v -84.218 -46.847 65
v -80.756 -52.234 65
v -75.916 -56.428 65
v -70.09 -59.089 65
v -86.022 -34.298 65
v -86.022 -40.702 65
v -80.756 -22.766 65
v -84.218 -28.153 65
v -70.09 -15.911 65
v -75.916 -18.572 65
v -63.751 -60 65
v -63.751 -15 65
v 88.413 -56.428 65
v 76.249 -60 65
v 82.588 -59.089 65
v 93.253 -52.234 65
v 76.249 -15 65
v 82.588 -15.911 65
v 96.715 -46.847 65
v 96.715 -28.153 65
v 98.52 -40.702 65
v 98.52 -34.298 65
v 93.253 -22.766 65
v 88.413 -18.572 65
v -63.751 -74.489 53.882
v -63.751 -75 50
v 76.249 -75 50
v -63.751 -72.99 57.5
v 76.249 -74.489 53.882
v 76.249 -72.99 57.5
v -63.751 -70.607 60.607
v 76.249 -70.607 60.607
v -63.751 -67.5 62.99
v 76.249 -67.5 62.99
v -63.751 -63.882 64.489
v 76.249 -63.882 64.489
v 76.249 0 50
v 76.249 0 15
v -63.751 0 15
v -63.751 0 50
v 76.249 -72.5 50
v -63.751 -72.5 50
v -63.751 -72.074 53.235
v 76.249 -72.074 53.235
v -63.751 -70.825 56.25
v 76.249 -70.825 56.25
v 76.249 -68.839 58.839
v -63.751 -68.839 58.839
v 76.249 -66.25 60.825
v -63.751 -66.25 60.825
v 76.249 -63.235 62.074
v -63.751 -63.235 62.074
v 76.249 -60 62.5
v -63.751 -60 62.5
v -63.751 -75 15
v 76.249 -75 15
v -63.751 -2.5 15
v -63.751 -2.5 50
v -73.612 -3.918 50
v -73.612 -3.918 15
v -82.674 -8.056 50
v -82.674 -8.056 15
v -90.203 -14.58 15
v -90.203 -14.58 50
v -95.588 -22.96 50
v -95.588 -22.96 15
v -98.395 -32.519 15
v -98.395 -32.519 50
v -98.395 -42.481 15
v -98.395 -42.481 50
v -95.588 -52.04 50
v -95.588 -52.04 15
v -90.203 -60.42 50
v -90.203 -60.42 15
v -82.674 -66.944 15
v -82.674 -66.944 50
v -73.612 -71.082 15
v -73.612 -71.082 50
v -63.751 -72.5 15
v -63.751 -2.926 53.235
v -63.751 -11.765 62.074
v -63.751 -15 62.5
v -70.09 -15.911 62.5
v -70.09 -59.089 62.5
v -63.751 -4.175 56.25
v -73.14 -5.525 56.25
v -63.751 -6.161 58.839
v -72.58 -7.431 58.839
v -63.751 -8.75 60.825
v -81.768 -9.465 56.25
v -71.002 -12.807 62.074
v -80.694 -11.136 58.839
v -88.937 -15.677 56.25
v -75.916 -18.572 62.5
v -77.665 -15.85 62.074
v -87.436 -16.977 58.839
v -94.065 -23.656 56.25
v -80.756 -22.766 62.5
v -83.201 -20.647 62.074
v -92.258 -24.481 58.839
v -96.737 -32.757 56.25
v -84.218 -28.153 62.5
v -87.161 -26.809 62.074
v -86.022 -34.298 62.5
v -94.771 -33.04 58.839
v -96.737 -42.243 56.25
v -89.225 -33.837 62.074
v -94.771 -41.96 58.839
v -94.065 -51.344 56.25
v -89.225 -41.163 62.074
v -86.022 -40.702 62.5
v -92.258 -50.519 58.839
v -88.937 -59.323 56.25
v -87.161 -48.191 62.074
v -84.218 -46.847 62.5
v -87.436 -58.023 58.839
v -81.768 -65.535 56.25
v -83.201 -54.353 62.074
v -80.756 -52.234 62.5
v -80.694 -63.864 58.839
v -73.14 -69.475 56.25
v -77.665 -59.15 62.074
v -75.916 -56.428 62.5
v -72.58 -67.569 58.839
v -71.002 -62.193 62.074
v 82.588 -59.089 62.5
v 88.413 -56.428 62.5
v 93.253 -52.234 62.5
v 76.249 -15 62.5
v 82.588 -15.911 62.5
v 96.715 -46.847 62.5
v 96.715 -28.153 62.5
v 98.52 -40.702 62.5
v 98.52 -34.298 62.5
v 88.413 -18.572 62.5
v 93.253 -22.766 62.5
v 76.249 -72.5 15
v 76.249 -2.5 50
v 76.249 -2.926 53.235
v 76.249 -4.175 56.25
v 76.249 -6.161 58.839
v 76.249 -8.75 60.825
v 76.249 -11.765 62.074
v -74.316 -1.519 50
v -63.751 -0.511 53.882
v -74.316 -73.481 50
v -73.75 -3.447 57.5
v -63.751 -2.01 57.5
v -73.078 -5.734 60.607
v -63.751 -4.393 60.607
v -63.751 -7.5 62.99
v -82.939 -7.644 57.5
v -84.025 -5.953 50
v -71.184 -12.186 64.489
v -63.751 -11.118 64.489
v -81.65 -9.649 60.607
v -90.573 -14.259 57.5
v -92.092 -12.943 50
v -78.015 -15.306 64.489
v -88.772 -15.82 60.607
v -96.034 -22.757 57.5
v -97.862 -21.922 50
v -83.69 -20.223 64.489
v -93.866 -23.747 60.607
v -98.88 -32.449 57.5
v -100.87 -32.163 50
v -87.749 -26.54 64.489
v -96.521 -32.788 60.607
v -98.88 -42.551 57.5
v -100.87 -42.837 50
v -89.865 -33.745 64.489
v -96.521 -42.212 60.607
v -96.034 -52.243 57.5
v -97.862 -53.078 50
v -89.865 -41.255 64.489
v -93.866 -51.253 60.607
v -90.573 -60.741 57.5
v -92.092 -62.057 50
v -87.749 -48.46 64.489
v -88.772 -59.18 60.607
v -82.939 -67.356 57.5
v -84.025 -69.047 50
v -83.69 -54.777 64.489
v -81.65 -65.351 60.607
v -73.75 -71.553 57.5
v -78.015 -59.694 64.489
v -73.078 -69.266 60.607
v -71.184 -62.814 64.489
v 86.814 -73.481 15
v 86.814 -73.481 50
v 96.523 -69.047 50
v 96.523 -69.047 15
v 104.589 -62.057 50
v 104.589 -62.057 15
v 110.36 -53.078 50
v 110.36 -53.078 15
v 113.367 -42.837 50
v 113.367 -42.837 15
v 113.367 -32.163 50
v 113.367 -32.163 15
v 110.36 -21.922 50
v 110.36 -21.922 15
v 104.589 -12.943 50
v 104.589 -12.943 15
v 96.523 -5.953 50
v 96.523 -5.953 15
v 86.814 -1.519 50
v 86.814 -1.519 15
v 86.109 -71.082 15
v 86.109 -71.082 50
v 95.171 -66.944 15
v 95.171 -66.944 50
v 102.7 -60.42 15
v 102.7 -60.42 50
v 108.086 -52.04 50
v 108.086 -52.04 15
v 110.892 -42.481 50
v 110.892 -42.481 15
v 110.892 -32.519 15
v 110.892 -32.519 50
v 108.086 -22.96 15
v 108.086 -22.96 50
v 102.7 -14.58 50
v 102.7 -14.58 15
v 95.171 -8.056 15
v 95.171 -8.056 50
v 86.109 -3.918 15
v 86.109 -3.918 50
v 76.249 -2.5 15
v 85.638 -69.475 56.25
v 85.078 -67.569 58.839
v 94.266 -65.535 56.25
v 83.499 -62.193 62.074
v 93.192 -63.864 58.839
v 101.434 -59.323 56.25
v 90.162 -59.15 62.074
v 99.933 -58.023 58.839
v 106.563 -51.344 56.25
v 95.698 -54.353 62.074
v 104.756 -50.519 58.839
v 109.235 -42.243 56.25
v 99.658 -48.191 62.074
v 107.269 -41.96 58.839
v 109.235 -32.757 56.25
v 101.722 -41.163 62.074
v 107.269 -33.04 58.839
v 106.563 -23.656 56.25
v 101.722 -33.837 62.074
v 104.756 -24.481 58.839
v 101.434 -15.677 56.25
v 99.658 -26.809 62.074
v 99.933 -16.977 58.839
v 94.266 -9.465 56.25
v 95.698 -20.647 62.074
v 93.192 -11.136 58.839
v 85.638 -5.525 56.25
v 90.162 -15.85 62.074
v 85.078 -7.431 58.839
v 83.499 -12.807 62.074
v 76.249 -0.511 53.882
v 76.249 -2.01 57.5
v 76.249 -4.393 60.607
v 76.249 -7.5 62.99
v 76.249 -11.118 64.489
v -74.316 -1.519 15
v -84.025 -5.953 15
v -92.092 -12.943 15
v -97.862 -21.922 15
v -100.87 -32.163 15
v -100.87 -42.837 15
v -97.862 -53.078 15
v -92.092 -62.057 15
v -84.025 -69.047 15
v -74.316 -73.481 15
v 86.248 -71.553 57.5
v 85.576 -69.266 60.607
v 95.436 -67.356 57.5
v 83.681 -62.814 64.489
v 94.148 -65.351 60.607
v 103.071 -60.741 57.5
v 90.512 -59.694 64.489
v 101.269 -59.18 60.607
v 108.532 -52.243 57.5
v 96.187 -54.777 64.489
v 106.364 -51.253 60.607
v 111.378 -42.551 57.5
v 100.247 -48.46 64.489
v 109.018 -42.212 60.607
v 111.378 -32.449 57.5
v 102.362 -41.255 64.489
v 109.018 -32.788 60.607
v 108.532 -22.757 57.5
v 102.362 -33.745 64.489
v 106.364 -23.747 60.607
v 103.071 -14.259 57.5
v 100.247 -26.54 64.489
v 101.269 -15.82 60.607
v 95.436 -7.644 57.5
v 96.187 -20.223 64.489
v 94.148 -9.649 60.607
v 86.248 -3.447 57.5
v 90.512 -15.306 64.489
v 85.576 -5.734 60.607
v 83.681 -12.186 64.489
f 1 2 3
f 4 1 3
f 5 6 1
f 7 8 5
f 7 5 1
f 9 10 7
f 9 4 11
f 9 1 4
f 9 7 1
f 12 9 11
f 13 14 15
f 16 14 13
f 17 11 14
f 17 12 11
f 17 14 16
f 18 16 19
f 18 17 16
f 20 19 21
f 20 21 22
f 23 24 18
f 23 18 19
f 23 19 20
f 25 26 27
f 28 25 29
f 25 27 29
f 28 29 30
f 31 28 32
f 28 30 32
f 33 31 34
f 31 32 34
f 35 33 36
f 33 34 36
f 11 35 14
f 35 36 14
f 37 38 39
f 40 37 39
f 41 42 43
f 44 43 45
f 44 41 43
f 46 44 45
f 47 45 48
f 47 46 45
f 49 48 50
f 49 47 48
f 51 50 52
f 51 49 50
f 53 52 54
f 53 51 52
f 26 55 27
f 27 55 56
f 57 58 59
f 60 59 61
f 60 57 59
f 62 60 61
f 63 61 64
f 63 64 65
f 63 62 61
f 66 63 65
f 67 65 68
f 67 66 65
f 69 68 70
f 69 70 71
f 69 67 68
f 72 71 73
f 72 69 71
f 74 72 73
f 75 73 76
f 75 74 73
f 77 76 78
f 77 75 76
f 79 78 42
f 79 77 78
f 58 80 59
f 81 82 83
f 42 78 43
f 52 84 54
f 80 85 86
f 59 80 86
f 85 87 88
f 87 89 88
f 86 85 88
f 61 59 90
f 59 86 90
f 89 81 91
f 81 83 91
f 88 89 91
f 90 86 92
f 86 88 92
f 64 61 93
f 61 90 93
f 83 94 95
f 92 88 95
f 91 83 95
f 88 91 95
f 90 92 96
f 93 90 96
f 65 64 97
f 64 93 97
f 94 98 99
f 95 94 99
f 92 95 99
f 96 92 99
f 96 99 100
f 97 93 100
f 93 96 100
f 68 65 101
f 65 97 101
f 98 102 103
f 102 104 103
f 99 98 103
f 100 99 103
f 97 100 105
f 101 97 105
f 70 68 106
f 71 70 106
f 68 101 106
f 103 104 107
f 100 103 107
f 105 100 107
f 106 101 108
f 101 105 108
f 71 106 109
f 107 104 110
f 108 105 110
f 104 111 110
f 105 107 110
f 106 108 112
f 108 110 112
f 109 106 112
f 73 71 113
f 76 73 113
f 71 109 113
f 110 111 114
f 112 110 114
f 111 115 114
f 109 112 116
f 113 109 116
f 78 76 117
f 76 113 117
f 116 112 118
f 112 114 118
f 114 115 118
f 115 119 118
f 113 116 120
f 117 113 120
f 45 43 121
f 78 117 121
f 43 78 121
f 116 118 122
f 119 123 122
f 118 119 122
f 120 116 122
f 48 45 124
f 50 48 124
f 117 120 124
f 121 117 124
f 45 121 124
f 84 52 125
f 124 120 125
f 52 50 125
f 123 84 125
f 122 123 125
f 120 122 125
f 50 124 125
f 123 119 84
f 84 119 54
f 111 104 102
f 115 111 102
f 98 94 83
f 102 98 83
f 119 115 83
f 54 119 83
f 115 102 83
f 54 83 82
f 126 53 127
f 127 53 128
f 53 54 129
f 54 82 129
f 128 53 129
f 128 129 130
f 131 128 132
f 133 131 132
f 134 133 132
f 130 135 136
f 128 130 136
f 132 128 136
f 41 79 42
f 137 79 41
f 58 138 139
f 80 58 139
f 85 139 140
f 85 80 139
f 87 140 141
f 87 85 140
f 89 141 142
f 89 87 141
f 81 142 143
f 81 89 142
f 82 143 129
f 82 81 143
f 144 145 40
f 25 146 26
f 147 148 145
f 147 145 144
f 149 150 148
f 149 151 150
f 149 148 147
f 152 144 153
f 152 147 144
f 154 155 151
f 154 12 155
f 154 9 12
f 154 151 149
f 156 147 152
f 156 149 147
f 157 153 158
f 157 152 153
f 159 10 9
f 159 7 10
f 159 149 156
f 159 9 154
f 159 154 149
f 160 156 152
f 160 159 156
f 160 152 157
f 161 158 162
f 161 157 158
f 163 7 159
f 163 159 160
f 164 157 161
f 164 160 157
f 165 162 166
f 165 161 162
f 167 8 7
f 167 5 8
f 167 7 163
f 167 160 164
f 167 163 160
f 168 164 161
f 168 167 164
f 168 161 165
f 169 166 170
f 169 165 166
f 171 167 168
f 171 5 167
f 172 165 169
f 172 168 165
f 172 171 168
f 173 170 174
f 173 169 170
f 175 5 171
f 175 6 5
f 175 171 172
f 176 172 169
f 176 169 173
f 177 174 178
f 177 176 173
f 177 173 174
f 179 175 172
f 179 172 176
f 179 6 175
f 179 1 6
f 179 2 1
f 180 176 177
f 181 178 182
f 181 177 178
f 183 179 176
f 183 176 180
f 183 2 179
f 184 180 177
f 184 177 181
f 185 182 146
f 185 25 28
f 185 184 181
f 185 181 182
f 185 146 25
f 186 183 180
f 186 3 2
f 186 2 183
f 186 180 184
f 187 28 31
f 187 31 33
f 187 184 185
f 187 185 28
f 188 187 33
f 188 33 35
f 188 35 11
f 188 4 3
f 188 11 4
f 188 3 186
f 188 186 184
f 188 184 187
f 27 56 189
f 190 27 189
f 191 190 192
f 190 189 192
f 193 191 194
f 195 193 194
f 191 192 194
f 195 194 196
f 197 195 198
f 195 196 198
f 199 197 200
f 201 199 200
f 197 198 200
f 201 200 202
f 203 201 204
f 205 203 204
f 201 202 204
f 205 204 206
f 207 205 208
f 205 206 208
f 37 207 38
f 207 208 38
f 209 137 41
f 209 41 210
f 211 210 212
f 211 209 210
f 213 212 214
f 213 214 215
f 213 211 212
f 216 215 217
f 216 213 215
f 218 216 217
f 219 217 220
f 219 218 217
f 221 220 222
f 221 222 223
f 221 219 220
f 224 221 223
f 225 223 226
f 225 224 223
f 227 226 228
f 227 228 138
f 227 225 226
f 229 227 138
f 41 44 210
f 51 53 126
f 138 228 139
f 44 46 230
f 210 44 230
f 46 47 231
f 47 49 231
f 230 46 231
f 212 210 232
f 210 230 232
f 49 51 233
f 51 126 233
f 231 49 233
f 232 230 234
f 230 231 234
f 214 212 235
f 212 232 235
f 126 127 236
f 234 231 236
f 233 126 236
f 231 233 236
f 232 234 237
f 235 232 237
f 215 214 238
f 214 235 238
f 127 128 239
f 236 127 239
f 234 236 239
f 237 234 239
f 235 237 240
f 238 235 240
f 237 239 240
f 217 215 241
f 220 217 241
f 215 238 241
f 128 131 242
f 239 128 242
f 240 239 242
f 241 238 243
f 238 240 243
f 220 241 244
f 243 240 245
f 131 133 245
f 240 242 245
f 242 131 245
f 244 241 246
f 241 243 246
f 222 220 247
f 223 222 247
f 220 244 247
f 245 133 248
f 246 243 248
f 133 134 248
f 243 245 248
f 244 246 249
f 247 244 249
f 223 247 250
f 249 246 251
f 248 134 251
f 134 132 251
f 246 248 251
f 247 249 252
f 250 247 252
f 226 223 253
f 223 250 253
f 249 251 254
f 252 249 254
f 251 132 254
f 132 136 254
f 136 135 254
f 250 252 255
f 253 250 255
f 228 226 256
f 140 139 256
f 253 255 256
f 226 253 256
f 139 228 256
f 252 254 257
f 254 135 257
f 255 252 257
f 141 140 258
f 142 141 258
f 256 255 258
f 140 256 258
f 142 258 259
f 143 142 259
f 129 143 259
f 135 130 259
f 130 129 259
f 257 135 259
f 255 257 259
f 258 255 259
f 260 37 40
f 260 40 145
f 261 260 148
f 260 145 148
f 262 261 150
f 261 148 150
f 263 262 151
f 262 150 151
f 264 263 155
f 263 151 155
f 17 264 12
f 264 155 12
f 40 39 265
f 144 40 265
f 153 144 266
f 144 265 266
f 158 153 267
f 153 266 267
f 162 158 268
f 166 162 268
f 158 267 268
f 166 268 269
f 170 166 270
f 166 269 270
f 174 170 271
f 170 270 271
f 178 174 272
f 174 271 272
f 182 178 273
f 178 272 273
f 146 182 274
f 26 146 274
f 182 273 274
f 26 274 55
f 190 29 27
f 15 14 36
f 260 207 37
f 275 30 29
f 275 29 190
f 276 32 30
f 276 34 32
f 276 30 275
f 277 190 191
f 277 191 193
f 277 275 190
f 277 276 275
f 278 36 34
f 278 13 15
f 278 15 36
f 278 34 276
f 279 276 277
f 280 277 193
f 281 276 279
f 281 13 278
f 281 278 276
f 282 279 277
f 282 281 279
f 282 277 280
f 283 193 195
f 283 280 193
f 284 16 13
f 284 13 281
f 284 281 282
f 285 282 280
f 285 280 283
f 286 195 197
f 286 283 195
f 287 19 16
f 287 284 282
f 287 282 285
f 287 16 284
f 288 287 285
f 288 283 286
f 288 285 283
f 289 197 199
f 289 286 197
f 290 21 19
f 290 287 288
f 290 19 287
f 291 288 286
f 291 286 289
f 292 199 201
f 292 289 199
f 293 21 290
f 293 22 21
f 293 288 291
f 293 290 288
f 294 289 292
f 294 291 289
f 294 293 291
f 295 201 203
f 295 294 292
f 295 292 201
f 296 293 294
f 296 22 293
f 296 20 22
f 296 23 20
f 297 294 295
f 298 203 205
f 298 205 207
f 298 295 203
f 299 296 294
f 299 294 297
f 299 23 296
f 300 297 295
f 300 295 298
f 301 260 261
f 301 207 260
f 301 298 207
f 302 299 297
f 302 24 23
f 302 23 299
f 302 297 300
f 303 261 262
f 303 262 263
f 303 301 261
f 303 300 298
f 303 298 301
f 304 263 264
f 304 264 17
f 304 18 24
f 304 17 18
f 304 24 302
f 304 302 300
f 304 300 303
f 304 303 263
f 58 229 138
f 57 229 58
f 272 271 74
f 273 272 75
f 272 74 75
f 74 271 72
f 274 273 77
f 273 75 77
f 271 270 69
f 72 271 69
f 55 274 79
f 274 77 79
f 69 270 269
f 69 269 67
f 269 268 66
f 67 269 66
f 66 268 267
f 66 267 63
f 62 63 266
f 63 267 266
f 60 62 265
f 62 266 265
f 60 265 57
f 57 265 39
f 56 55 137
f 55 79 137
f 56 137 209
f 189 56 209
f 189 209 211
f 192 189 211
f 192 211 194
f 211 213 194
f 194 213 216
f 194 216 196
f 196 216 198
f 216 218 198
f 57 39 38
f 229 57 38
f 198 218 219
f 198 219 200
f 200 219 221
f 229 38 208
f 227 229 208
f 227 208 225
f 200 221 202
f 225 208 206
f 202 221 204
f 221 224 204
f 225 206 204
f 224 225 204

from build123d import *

# Parameters (mm, degrees)
F0_W     = 63.7512656803
F0_H     = 75
F0_W_2   = 76.2487343197
F1_DEPTH = 65
F2_R     = 15
F3_T     = 2.5


# Not quite as in the source:
# - a shell that OpenCascade refuses in one call is made with other operations: the cavity is built on its own and cut out


with BuildPart() as f1:
    # F0 (on Top) → F1 (new body)
    with BuildSketch(Plane.XY):
        with BuildLine():
            Line((-63.7512656803, -75), (-63.7512656803, 0))
            ThreePointArc((-63.7512656803, 0), (-101.2512656803, -37.5), (-63.7512656803, -75))
        make_face()
        with Locations((-31.8756328402, -37.5)):
            Rectangle(F0_W, F0_H)
        with Locations((38.1243671598, -37.5)):
            Rectangle(F0_W_2, F0_H)
        with BuildLine():
            ThreePointArc((76.2487343197, -75), (113.7487343197, -37.5), (76.2487343197, 0))
            Line((76.2487343197, 0), (76.2487343197, -75))
        make_face()
    extrude(amount=F1_DEPTH)

    # F2
    f2_edges = [f1.edges().sort_by_distance(p)[0] for p in [
        (-101.251266, -37.5, 65),
        (113.748734, -37.5, 0),
        (6.248734, -75, 65),
        (113.748734, -37.5, 65),
        (6.248734, 0, 65),
    ]]
    fillet(f2_edges, radius=F2_R)

    # F3: shell of thickness 2.5, made by hand


with BuildPart() as f3_core1:
    # F3_t2: copy of F1
    add(f1.part)

    # the walls: a layer under each face that stays
    f3_faces = [f3_core1.faces().sort_by_distance(p)[0] for p in [
        (-101.2512656803, -37.5, 32.5),
        (6.2487343197, 0, 32.5),
        (-96.8578673981, -37.5, 60.6066017178),
        (6.2487343197, -75, 32.5),
        (113.7487343197, -37.5, 32.5),
        (6.2487343197, -4.3933982822, 60.6066017178),
        (6.2487343197, -37.5, 65),
        (6.2487343197, -70.6066017178, 60.6066017178),
        (109.3553360375, -37.5, 60.6066017178),
    ]]
    thicken(f3_faces, amount=-F3_T, mode=Mode.SUBTRACT)


with BuildPart() as f1_1:
    add(f1.part)

    # what is left inside the walls is the cavity
    f3_cavity = [f3_core1.part.solids().sort_by_distance(p)[0] for p in [
        (6.248734, -45, 0.025),
    ]]
    add(f3_cavity, mode=Mode.SUBTRACT)


solid = f1_1.part
